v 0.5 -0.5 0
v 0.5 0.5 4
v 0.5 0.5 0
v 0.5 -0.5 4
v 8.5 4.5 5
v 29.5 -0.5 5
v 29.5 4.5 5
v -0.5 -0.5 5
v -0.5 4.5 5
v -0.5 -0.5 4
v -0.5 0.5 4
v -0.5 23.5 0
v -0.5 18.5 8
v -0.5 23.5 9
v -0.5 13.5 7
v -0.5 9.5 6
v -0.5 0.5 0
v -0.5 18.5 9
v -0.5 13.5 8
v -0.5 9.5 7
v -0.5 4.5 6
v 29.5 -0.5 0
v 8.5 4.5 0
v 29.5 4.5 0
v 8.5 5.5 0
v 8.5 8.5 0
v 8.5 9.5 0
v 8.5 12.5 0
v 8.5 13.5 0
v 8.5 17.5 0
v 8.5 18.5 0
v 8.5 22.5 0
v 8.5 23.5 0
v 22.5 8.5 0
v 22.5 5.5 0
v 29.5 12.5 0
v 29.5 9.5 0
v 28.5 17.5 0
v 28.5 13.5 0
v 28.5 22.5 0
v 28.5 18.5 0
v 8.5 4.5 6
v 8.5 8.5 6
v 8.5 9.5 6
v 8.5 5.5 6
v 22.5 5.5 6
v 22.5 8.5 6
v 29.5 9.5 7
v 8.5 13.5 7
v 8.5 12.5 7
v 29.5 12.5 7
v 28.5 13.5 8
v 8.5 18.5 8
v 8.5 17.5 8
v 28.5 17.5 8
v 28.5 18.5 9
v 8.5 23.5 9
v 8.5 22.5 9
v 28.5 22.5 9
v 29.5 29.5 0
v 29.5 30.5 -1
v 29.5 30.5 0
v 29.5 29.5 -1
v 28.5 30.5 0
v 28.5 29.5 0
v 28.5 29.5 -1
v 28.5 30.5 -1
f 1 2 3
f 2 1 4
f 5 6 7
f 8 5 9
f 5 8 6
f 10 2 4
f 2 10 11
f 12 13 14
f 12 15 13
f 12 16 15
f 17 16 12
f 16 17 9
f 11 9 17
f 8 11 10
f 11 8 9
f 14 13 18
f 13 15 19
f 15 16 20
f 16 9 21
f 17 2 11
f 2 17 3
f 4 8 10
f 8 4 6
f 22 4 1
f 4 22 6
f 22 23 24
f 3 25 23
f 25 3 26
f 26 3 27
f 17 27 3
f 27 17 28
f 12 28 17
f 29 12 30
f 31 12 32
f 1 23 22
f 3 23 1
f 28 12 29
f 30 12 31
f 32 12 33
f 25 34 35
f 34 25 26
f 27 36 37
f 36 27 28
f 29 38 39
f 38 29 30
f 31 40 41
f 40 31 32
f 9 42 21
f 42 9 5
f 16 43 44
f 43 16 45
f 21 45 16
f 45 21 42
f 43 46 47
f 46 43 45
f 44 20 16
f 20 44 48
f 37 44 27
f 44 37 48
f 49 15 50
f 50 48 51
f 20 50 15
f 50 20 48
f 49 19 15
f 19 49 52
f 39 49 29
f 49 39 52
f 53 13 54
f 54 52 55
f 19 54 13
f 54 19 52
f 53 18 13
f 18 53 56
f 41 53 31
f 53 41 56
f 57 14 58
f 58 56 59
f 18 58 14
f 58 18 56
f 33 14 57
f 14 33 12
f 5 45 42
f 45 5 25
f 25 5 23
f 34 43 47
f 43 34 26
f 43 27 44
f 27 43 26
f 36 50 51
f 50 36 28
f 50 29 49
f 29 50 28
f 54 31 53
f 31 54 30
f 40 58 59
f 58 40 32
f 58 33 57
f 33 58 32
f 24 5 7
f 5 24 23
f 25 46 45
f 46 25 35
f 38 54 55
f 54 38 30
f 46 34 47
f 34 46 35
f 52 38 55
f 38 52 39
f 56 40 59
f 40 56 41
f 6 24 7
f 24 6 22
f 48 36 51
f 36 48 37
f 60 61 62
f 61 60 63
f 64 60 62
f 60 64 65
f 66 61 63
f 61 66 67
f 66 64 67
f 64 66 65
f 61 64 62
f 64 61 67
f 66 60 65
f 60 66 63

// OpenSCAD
union() {
    translate([0, 0, 4.5]) color([1, 0, 0]) cube([1, 1, 1], center=true);
    translate([0, 1, 2.5]) cube([1, 1, 5], center=true);
    translate([0, 2, 2.5]) cube([1, 1, 5], center=true);
    translate([0, 3, 2.5]) cube([1, 1, 5], center=true);
    translate([0, 4, 2.5]) cube([1, 1, 5], center=true);
    translate([0, 5, 3.0]) cube([1, 1, 6], center=true);
    translate([0, 6, 3.0]) cube([1, 1, 6], center=true);
    translate([0, 7, 3.0]) cube([1, 1, 6], center=true);
    translate([0, 8, 3.0]) cube([1, 1, 6], center=true);
    translate([0, 9, 3.0]) cube([1, 1, 6], center=true);
    translate([0, 10, 3.5]) cube([1, 1, 7], center=true);
    translate([0, 11, 3.5]) cube([1, 1, 7], center=true);
    translate([0, 12, 3.5]) cube([1, 1, 7], center=true);
    translate([0, 13, 3.5]) cube([1, 1, 7], center=true);
    translate([0, 14, 4.0]) cube([1, 1, 8], center=true);
    translate([0, 15, 4.0]) cube([1, 1, 8], center=true);
    translate([0, 16, 4.0]) cube([1, 1, 8], center=true);
    translate([0, 17, 4.0]) cube([1, 1, 8], center=true);
    translate([0, 18, 4.0]) cube([1, 1, 8], center=true);
    translate([0, 19, 4.5]) cube([1, 1, 9], center=true);
    translate([0, 20, 4.5]) cube([1, 1, 9], center=true);
    translate([0, 21, 4.5]) cube([1, 1, 9], center=true);
    translate([0, 22, 4.5]) cube([1, 1, 9], center=true);
    translate([0, 23, 4.5]) cube([1, 1, 9], center=true);
    translate([1, 0, 2.5]) cube([1, 1, 5], center=true);
    translate([1, 1, 2.5]) cube([1, 1, 5], center=true);
    translate([1, 2, 2.5]) cube([1, 1, 5], center=true);
    translate([1, 3, 2.5]) cube([1, 1, 5], center=true);
    translate([1, 4, 2.5]) cube([1, 1, 5], center=true);
    translate([1, 5, 3.0]) cube([1, 1, 6], center=true);
    translate([1, 6, 3.0]) cube([1, 1, 6], center=true);
    translate([1, 7, 3.0]) cube([1, 1, 6], center=true);
    translate([1, 8, 3.0]) cube([1, 1, 6], center=true);
    translate([1, 9, 3.0]) cube([1, 1, 6], center=true);
    translate([1, 10, 3.5]) cube([1, 1, 7], center=true);
    translate([1, 11, 3.5]) cube([1, 1, 7], center=true);
    translate([1, 12, 3.5]) cube([1, 1, 7], center=true);
    translate([1, 13, 3.5]) cube([1, 1, 7], center=true);
    translate([1, 14, 4.0]) cube([1, 1, 8], center=true);
    translate([1, 15, 4.0]) cube([1, 1, 8], center=true);
    translate([1, 16, 4.0]) cube([1, 1, 8], center=true);
    translate([1, 17, 4.0]) cube([1, 1, 8], center=true);
    translate([1, 18, 4.0]) cube([1, 1, 8], center=true);
    translate([1, 19, 4.5]) cube([1, 1, 9], center=true);
    translate([1, 20, 4.5]) cube([1, 1, 9], center=true);
    translate([1, 21, 4.5]) cube([1, 1, 9], center=true);
    translate([1, 22, 4.5]) cube([1, 1, 9], center=true);
    translate([1, 23, 4.5]) cube([1, 1, 9], center=true);
    translate([2, 0, 2.5]) cube([1, 1, 5], center=true);
    translate([2, 1, 2.5]) cube([1, 1, 5], center=true);
    translate([2, 2, 2.5]) cube([1, 1, 5], center=true);
    translate([2, 3, 2.5]) cube([1, 1, 5], center=true);
    translate([2, 4, 2.5]) cube([1, 1, 5], center=true);
    translate([2, 5, 3.0]) cube([1, 1, 6], center=true);
    translate([2, 6, 3.0]) cube([1, 1, 6], center=true);
    translate([2, 7, 3.0]) cube([1, 1, 6], center=true);
    translate([2, 8, 3.0]) cube([1, 1, 6], center=true);
    translate([2, 9, 3.0]) cube([1, 1, 6], center=true);
    translate([2, 10, 3.5]) cube([1, 1, 7], center=true);
    translate([2, 11, 3.5]) cube([1, 1, 7], center=true);
    translate([2, 12, 3.5]) cube([1, 1, 7], center=true);
    translate([2, 13, 3.5]) cube([1, 1, 7], center=true);
    translate([2, 14, 4.0]) cube([1, 1, 8], center=true);
    translate([2, 15, 4.0]) cube([1, 1, 8], center=true);
    translate([2, 16, 4.0]) cube([1, 1, 8], center=true);
    translate([2, 17, 4.0]) cube([1, 1, 8], center=true);
    translate([2, 18, 4.0]) cube([1, 1, 8], center=true);
    translate([2, 19, 4.5]) cube([1, 1, 9], center=true);
    translate([2, 20, 4.5]) cube([1, 1, 9], center=true);
    translate([2, 21, 4.5]) cube([1, 1, 9], center=true);
    translate([2, 22, 4.5]) cube([1, 1, 9], center=true);
    translate([2, 23, 4.5]) cube([1, 1, 9], center=true);
    translate([3, 0, 2.5]) cube([1, 1, 5], center=true);
    translate([3, 1, 2.5]) cube([1, 1, 5], center=true);
    translate([3, 2, 2.5]) cube([1, 1, 5], center=true);
    translate([3, 3, 2.5]) cube([1, 1, 5], center=true);
    translate([3, 4, 2.5]) cube([1, 1, 5], center=true);
    translate([3, 5, 3.0]) cube([1, 1, 6], center=true);
    translate([3, 6, 3.0]) cube([1, 1, 6], center=true);
    translate([3, 7, 3.0]) cube([1, 1, 6], center=true);
    translate([3, 8, 3.0]) cube([1, 1, 6], center=true);
    translate([3, 9, 3.0]) cube([1, 1, 6], center=true);
    translate([3, 10, 3.5]) cube([1, 1, 7], center=true);
    translate([3, 11, 3.5]) cube([1, 1, 7], center=true);
    translate([3, 12, 3.5]) cube([1, 1, 7], center=true);
    translate([3, 13, 3.5]) cube([1, 1, 7], center=true);
    translate([3, 14, 4.0]) cube([1, 1, 8], center=true);
    translate([3, 15, 4.0]) cube([1, 1, 8], center=true);
    translate([3, 16, 4.0]) cube([1, 1, 8], center=true);
    translate([3, 17, 4.0]) cube([1, 1, 8], center=true);
    translate([3, 18, 4.0]) cube([1, 1, 8], center=true);
    translate([3, 19, 4.5]) cube([1, 1, 9], center=true);
    translate([3, 20, 4.5]) cube([1, 1, 9], center=true);
    translate([3, 21, 4.5]) cube([1, 1, 9], center=true);
    translate([3, 22, 4.5]) cube([1, 1, 9], center=true);
    translate([3, 23, 4.5]) cube([1, 1, 9], center=true);
    translate([4, 0, 2.5]) cube([1, 1, 5], center=true);
    translate([4, 1, 2.5]) cube([1, 1, 5], center=true);
    translate([4, 2, 2.5]) cube([1, 1, 5], center=true);
    translate([4, 3, 2.5]) cube([1, 1, 5], center=true);
    translate([4, 4, 2.5]) cube([1, 1, 5], center=true);
    translate([4, 5, 3.0]) cube([1, 1, 6], center=true);
    translate([4, 6, 3.0]) cube([1, 1, 6], center=true);
    translate([4, 7, 3.0]) cube([1, 1, 6], center=true);
    translate([4, 8, 3.0]) cube([1, 1, 6], center=true);
    translate([4, 9, 3.0]) cube([1, 1, 6], center=true);
    translate([4, 10, 3.5]) cube([1, 1, 7], center=true);
    translate([4, 11, 3.5]) cube([1, 1, 7], center=true);
    translate([4, 12, 3.5]) cube([1, 1, 7], center=true);
    translate([4, 13, 3.5]) cube([1, 1, 7], center=true);
    translate([4, 14, 4.0]) cube([1, 1, 8], center=true);
    translate([4, 15, 4.0]) cube([1, 1, 8], center=true);
    translate([4, 16, 4.0]) cube([1, 1, 8], center=true);
    translate([4, 17, 4.0]) cube([1, 1, 8], center=true);
    translate([4, 18, 4.0]) cube([1, 1, 8], center=true);
    translate([4, 19, 4.5]) cube([1, 1, 9], center=true);
    translate([4, 20, 4.5]) cube([1, 1, 9], center=true);
    translate([4, 21, 4.5]) cube([1, 1, 9], center=true);
    translate([4, 22, 4.5]) cube([1, 1, 9], center=true);
    translate([4, 23, 4.5]) cube([1, 1, 9], center=true);
    translate([5, 0, 2.5]) cube([1, 1, 5], center=true);
    translate([5, 1, 2.5]) cube([1, 1, 5], center=true);
    translate([5, 2, 2.5]) cube([1, 1, 5], center=true);
    translate([5, 3, 2.5]) cube([1, 1, 5], center=true);
    translate([5, 4, 2.5]) cube([1, 1, 5], center=true);
    translate([5, 5, 3.0]) cube([1, 1, 6], center=true);
    translate([5, 6, 3.0]) cube([1, 1, 6], center=true);
    translate([5, 7, 3.0]) cube([1, 1, 6], center=true);
    translate([5, 8, 3.0]) cube([1, 1, 6], center=true);
    translate([5, 9, 3.0]) cube([1, 1, 6], center=true);
    translate([5, 10, 3.5]) cube([1, 1, 7], center=true);
    translate([5, 11, 3.5]) cube([1, 1, 7], center=true);
    translate([5, 12, 3.5]) cube([1, 1, 7], center=true);
    translate([5, 13, 3.5]) cube([1, 1, 7], center=true);
    translate([5, 14, 4.0]) cube([1, 1, 8], center=true);
    translate([5, 15, 4.0]) cube([1, 1, 8], center=true);
    translate([5, 16, 4.0]) cube([1, 1, 8], center=true);
    translate([5, 17, 4.0]) cube([1, 1, 8], center=true);
    translate([5, 18, 4.0]) cube([1, 1, 8], center=true);
    translate([5, 19, 4.5]) cube([1, 1, 9], center=true);
    translate([5, 20, 4.5]) cube([1, 1, 9], center=true);
    translate([5, 21, 4.5]) cube([1, 1, 9], center=true);
    translate([5, 22, 4.5]) cube([1, 1, 9], center=true);
    translate([5, 23, 4.5]) cube([1, 1, 9], center=true);
    translate([6, 0, 2.5]) cube([1, 1, 5], center=true);
    translate([6, 1, 2.5]) cube([1, 1, 5], center=true);
    translate([6, 2, 2.5]) cube([1, 1, 5], center=true);
    translate([6, 3, 2.5]) cube([1, 1, 5], center=true);
    translate([6, 4, 2.5]) cube([1, 1, 5], center=true);
    translate([6, 5, 3.0]) cube([1, 1, 6], center=true);
    translate([6, 6, 3.0]) cube([1, 1, 6], center=true);
    translate([6, 7, 3.0]) cube([1, 1, 6], center=true);
    translate([6, 8, 3.0]) cube([1, 1, 6], center=true);
    translate([6, 9, 3.0]) cube([1, 1, 6], center=true);
    translate([6, 10, 3.5]) cube([1, 1, 7], center=true);
    translate([6, 11, 3.5]) cube([1, 1, 7], center=true);
    translate([6, 12, 3.5]) cube([1, 1, 7], center=true);
    translate([6, 13, 3.5]) cube([1, 1, 7], center=true);
    translate([6, 14, 4.0]) cube([1, 1, 8], center=true);
    translate([6, 15, 4.0]) cube([1, 1, 8], center=true);
    translate([6, 16, 4.0]) cube([1, 1, 8], center=true);
    translate([6, 17, 4.0]) cube([1, 1, 8], center=true);
    translate([6, 18, 4.0]) cube([1, 1, 8], center=true);
    translate([6, 19, 4.5]) cube([1, 1, 9], center=true);
    translate([6, 20, 4.5]) cube([1, 1, 9], center=true);
    translate([6, 21, 4.5]) cube([1, 1, 9], center=true);
    translate([6, 22, 4.5]) cube([1, 1, 9], center=true);
    translate([6, 23, 4.5]) cube([1, 1, 9], center=true);
    translate([7, 0, 2.5]) cube([1, 1, 5], center=true);
    translate([7, 1, 2.5]) cube([1, 1, 5], center=true);
    translate([7, 2, 2.5]) cube([1, 1, 5], center=true);
    translate([7, 3, 2.5]) cube([1, 1, 5], center=true);
    translate([7, 4, 2.5]) cube([1, 1, 5], center=true);
    translate([7, 5, 3.0]) cube([1, 1, 6], center=true);
    translate([7, 6, 3.0]) cube([1, 1, 6], center=true);
    translate([7, 7, 3.0]) cube([1, 1, 6], center=true);
    translate([7, 8, 3.0]) cube([1, 1, 6], center=true);
    translate([7, 9, 3.0]) cube([1, 1, 6], center=true);
    translate([7, 10, 3.5]) cube([1, 1, 7], center=true);
    translate([7, 11, 3.5]) cube([1, 1, 7], center=true);
    translate([7, 12, 3.5]) cube([1, 1, 7], center=true);
    translate([7, 13, 3.5]) cube([1, 1, 7], center=true);
    translate([7, 14, 4.0]) cube([1, 1, 8], center=true);
    translate([7, 15, 4.0]) cube([1, 1, 8], center=true);
    translate([7, 16, 4.0]) cube([1, 1, 8], center=true);
    translate([7, 17, 4.0]) cube([1, 1, 8], center=true);
    translate([7, 18, 4.0]) cube([1, 1, 8], center=true);
    translate([7, 19, 4.5]) cube([1, 1, 9], center=true);
    translate([7, 20, 4.5]) cube([1, 1, 9], center=true);
    translate([7, 21, 4.5]) cube([1, 1, 9], center=true);
    translate([7, 22, 4.5]) cube([1, 1, 9], center=true);
    translate([7, 23, 4.5]) cube([1, 1, 9], center=true);
    translate([8, 0, 2.5]) cube([1, 1, 5], center=true);
    translate([8, 1, 2.5]) cube([1, 1, 5], center=true);
    translate([8, 2, 2.5]) cube([1, 1, 5], center=true);
    translate([8, 3, 2.5]) cube([1, 1, 5], center=true);
    translate([8, 4, 2.5]) cube([1, 1, 5], center=true);
    translate([8, 5, 3.0]) cube([1, 1, 6], center=true);
    translate([8, 6, 3.0]) cube([1, 1, 6], center=true);
    translate([8, 7, 3.0]) cube([1, 1, 6], center=true);
    translate([8, 8, 3.0]) cube([1, 1, 6], center=true);
    translate([8, 9, 3.0]) cube([1, 1, 6], center=true);
    translate([8, 10, 3.5]) cube([1, 1, 7], center=true);
    translate([8, 11, 3.5]) cube([1, 1, 7], center=true);
    translate([8, 12, 3.5]) cube([1, 1, 7], center=true);
    translate([8, 13, 3.5]) cube([1, 1, 7], center=true);
    translate([8, 14, 4.0]) cube([1, 1, 8], center=true);
    translate([8, 15, 4.0]) cube([1, 1, 8], center=true);
    translate([8, 16, 4.0]) cube([1, 1, 8], center=true);
    translate([8, 17, 4.0]) cube([1, 1, 8], center=true);
    translate([8, 18, 4.0]) cube([1, 1, 8], center=true);
    translate([8, 19, 4.5]) cube([1, 1, 9], center=true);
    translate([8, 20, 4.5]) cube([1, 1, 9], center=true);
    translate([8, 21, 4.5]) cube([1, 1, 9], center=true);
    translate([8, 22, 4.5]) cube([1, 1, 9], center=true);
    translate([8, 23, 4.5]) cube([1, 1, 9], center=true);
    translate([9, 0, 2.5]) cube([1, 1, 5], center=true);
    translate([9, 1, 2.5]) cube([1, 1, 5], center=true);
    translate([9, 2, 2.5]) cube([1, 1, 5], center=true);
    translate([9, 3, 2.5]) cube([1, 1, 5], center=true);
    translate([9, 4, 2.5]) cube([1, 1, 5], center=true);
    translate([9, 6, 3.0]) cube([1, 1, 6], center=true);
    translate([9, 7, 3.0]) cube([1, 1, 6], center=true);
    translate([9, 8, 3.0]) cube([1, 1, 6], center=true);
    translate([9, 10, 3.5]) cube([1, 1, 7], center=true);
    translate([9, 11, 3.5]) cube([1, 1, 7], center=true);
    translate([9, 12, 3.5]) cube([1, 1, 7], center=true);
    translate([9, 14, 4.0]) cube([1, 1, 8], center=true);
    translate([9, 15, 4.0]) cube([1, 1, 8], center=true);
    translate([9, 16, 4.0]) cube([1, 1, 8], center=true);
    translate([9, 17, 4.0]) cube([1, 1, 8], center=true);
    translate([9, 19, 4.5]) cube([1, 1, 9], center=true);
    translate([9, 20, 4.5]) cube([1, 1, 9], center=true);
    translate([9, 21, 4.5]) cube([1, 1, 9], center=true);
    translate([9, 22, 4.5]) cube([1, 1, 9], center=true);
    translate([10, 0, 2.5]) cube([1, 1, 5], center=true);
    translate([10, 1, 2.5]) cube([1, 1, 5], center=true);
    translate([10, 2, 2.5]) cube([1, 1, 5], center=true);
    translate([10, 3, 2.5]) cube([1, 1, 5], center=true);
    translate([10, 4, 2.5]) cube([1, 1, 5], center=true);
    translate([10, 6, 3.0]) cube([1, 1, 6], center=true);
    translate([10, 7, 3.0]) cube([1, 1, 6], center=true);
    translate([10, 8, 3.0]) cube([1, 1, 6], center=true);
    translate([10, 10, 3.5]) cube([1, 1, 7], center=true);
    translate([10, 11, 3.5]) cube([1, 1, 7], center=true);
    translate([10, 12, 3.5]) cube([1, 1, 7], center=true);
    translate([10, 14, 4.0]) cube([1, 1, 8], center=true);
    translate([10, 15, 4.0]) cube([1, 1, 8], center=true);
    translate([10, 16, 4.0]) cube([1, 1, 8], center=true);
    translate([10, 17, 4.0]) cube([1, 1, 8], center=true);
    translate([10, 19, 4.5]) cube([1, 1, 9], center=true);
    translate([10, 20, 4.5]) cube([1, 1, 9], center=true);
    translate([10, 21, 4.5]) cube([1, 1, 9], center=true);
    translate([10, 22, 4.5]) cube([1, 1, 9], center=true);
    translate([11, 0, 2.5]) cube([1, 1, 5], center=true);
    translate([11, 1, 2.5]) cube([1, 1, 5], center=true);
    translate([11, 2, 2.5]) cube([1, 1, 5], center=true);
    translate([11, 3, 2.5]) cube([1, 1, 5], center=true);
    translate([11, 4, 2.5]) cube([1, 1, 5], center=true);
    translate([11, 6, 3.0]) cube([1, 1, 6], center=true);
    translate([11, 7, 3.0]) cube([1, 1, 6], center=true);
    translate([11, 8, 3.0]) cube([1, 1, 6], center=true);
    translate([11, 10, 3.5]) cube([1, 1, 7], center=true);
    translate([11, 11, 3.5]) cube([1, 1, 7], center=true);
    translate([11, 12, 3.5]) cube([1, 1, 7], center=true);
    translate([11, 14, 4.0]) cube([1, 1, 8], center=true);
    translate([11, 15, 4.0]) cube([1, 1, 8], center=true);
    translate([11, 16, 4.0]) cube([1, 1, 8], center=true);
    translate([11, 17, 4.0]) cube([1, 1, 8], center=true);
    translate([11, 19, 4.5]) cube([1, 1, 9], center=true);
    translate([11, 20, 4.5]) cube([1, 1, 9], center=true);
    translate([11, 21, 4.5]) cube([1, 1, 9], center=true);
    translate([11, 22, 4.5]) cube([1, 1, 9], center=true);
    translate([12, 0, 2.5]) cube([1, 1, 5], center=true);
    translate([12, 1, 2.5]) cube([1, 1, 5], center=true);
    translate([12, 2, 2.5]) cube([1, 1, 5], center=true);
    translate([12, 3, 2.5]) cube([1, 1, 5], center=true);
    translate([12, 4, 2.5]) cube([1, 1, 5], center=true);
    translate([12, 6, 3.0]) cube([1, 1, 6], center=true);
    translate([12, 7, 3.0]) cube([1, 1, 6], center=true);
    translate([12, 8, 3.0]) cube([1, 1, 6], center=true);
    translate([12, 10, 3.5]) cube([1, 1, 7], center=true);
    translate([12, 11, 3.5]) cube([1, 1, 7], center=true);
    translate([12, 12, 3.5]) cube([1, 1, 7], center=true);
    translate([12, 14, 4.0]) cube([1, 1, 8], center=true);
    translate([12, 15, 4.0]) cube([1, 1, 8], center=true);
    translate([12, 16, 4.0]) cube([1, 1, 8], center=true);
    translate([12, 17, 4.0]) cube([1, 1, 8], center=true);
    translate([12, 19, 4.5]) cube([1, 1, 9], center=true);
    translate([12, 20, 4.5]) cube([1, 1, 9], center=true);
    translate([12, 21, 4.5]) cube([1, 1, 9], center=true);
    translate([12, 22, 4.5]) cube([1, 1, 9], center=true);
    translate([13, 0, 2.5]) cube([1, 1, 5], center=true);
    translate([13, 1, 2.5]) cube([1, 1, 5], center=true);
    translate([13, 2, 2.5]) cube([1, 1, 5], center=true);
    translate([13, 3, 2.5]) cube([1, 1, 5], center=true);
    translate([13, 4, 2.5]) cube([1, 1, 5], center=true);
    translate([13, 6, 3.0]) cube([1, 1, 6], center=true);
    translate([13, 7, 3.0]) cube([1, 1, 6], center=true);
    translate([13, 8, 3.0]) cube([1, 1, 6], center=true);
    translate([13, 10, 3.5]) cube([1, 1, 7], center=true);
    translate([13, 11, 3.5]) cube([1, 1, 7], center=true);
    translate([13, 12, 3.5]) cube([1, 1, 7], center=true);
    translate([13, 14, 4.0]) cube([1, 1, 8], center=true);
    translate([13, 15, 4.0]) cube([1, 1, 8], center=true);
    translate([13, 16, 4.0]) cube([1, 1, 8], center=true);
    translate([13, 17, 4.0]) cube([1, 1, 8], center=true);
    translate([13, 19, 4.5]) cube([1, 1, 9], center=true);
    translate([13, 20, 4.5]) cube([1, 1, 9], center=true);
    translate([13, 21, 4.5]) cube([1, 1, 9], center=true);
    translate([13, 22, 4.5]) cube([1, 1, 9], center=true);
    translate([14, 0, 2.5]) cube([1, 1, 5], center=true);
    translate([14, 1, 2.5]) cube([1, 1, 5], center=true);
    translate([14, 2, 2.5]) cube([1, 1, 5], center=true);
    translate([14, 3, 2.5]) cube([1, 1, 5], center=true);
    translate([14, 4, 2.5]) cube([1, 1, 5], center=true);
    translate([14, 6, 3.0]) cube([1, 1, 6], center=true);
    translate([14, 7, 3.0]) cube([1, 1, 6], center=true);
    translate([14, 8, 3.0]) cube([1, 1, 6], center=true);
    translate([14, 10, 3.5]) cube([1, 1, 7], center=true);
    translate([14, 11, 3.5]) cube([1, 1, 7], center=true);
    translate([14, 12, 3.5]) cube([1, 1, 7], center=true);
    translate([14, 14, 4.0]) cube([1, 1, 8], center=true);
    translate([14, 15, 4.0]) cube([1, 1, 8], center=true);
    translate([14, 16, 4.0]) cube([1, 1, 8], center=true);
    translate([14, 17, 4.0]) cube([1, 1, 8], center=true);
    translate([14, 19, 4.5]) cube([1, 1, 9], center=true);
    translate([14, 20, 4.5]) cube([1, 1, 9], center=true);
    translate([14, 21, 4.5]) cube([1, 1, 9], center=true);
    translate([14, 22, 4.5]) cube([1, 1, 9], center=true);
    translate([15, 0, 2.5]) cube([1, 1, 5], center=true);
    translate([15, 1, 2.5]) cube([1, 1, 5], center=true);
    translate([15, 2, 2.5]) cube([1, 1, 5], center=true);
    translate([15, 3, 2.5]) cube([1, 1, 5], center=true);
    translate([15, 4, 2.5]) cube([1, 1, 5], center=true);
    translate([15, 6, 3.0]) cube([1, 1, 6], center=true);
    translate([15, 7, 3.0]) cube([1, 1, 6], center=true);
    translate([15, 8, 3.0]) cube([1, 1, 6], center=true);
    translate([15, 10, 3.5]) cube([1, 1, 7], center=true);
    translate([15, 11, 3.5]) cube([1, 1, 7], center=true);
    translate([15, 12, 3.5]) cube([1, 1, 7], center=true);
    translate([15, 14, 4.0]) cube([1, 1, 8], center=true);
    translate([15, 15, 4.0]) cube([1, 1, 8], center=true);
    translate([15, 16, 4.0]) cube([1, 1, 8], center=true);
    translate([15, 17, 4.0]) cube([1, 1, 8], center=true);
    translate([15, 19, 4.5]) cube([1, 1, 9], center=true);
    translate([15, 20, 4.5]) cube([1, 1, 9], center=true);
    translate([15, 21, 4.5]) cube([1, 1, 9], center=true);
    translate([15, 22, 4.5]) cube([1, 1, 9], center=true);
    translate([16, 0, 2.5]) cube([1, 1, 5], center=true);
    translate([16, 1, 2.5]) cube([1, 1, 5], center=true);
    translate([16, 2, 2.5]) cube([1, 1, 5], center=true);
    translate([16, 3, 2.5]) cube([1, 1, 5], center=true);
    translate([16, 4, 2.5]) cube([1, 1, 5], center=true);
    translate([16, 6, 3.0]) cube([1, 1, 6], center=true);
    translate([16, 7, 3.0]) cube([1, 1, 6], center=true);
    translate([16, 8, 3.0]) cube([1, 1, 6], center=true);
    translate([16, 10, 3.5]) cube([1, 1, 7], center=true);
    translate([16, 11, 3.5]) cube([1, 1, 7], center=true);
    translate([16, 12, 3.5]) cube([1, 1, 7], center=true);
    translate([16, 14, 4.0]) cube([1, 1, 8], center=true);
    translate([16, 15, 4.0]) cube([1, 1, 8], center=true);
    translate([16, 16, 4.0]) cube([1, 1, 8], center=true);
    translate([16, 17, 4.0]) cube([1, 1, 8], center=true);
    translate([16, 19, 4.5]) cube([1, 1, 9], center=true);
    translate([16, 20, 4.5]) cube([1, 1, 9], center=true);
    translate([16, 21, 4.5]) cube([1, 1, 9], center=true);
    translate([16, 22, 4.5]) cube([1, 1, 9], center=true);
    translate([17, 0, 2.5]) cube([1, 1, 5], center=true);
    translate([17, 1, 2.5]) cube([1, 1, 5], center=true);
    translate([17, 2, 2.5]) cube([1, 1, 5], center=true);
    translate([17, 3, 2.5]) cube([1, 1, 5], center=true);
    translate([17, 4, 2.5]) cube([1, 1, 5], center=true);
    translate([17, 6, 3.0]) cube([1, 1, 6], center=true);
    translate([17, 7, 3.0]) cube([1, 1, 6], center=true);
    translate([17, 8, 3.0]) cube([1, 1, 6], center=true);
    translate([17, 10, 3.5]) cube([1, 1, 7], center=true);
    translate([17, 11, 3.5]) cube([1, 1, 7], center=true);
    translate([17, 12, 3.5]) cube([1, 1, 7], center=true);
    translate([17, 14, 4.0]) cube([1, 1, 8], center=true);
    translate([17, 15, 4.0]) cube([1, 1, 8], center=true);
    translate([17, 16, 4.0]) cube([1, 1, 8], center=true);
    translate([17, 17, 4.0]) cube([1, 1, 8], center=true);
    translate([17, 19, 4.5]) cube([1, 1, 9], center=true);
    translate([17, 20, 4.5]) cube([1, 1, 9], center=true);
    translate([17, 21, 4.5]) cube([1, 1, 9], center=true);
    translate([17, 22, 4.5]) cube([1, 1, 9], center=true);
    translate([18, 0, 2.5]) cube([1, 1, 5], center=true);
    translate([18, 1, 2.5]) cube([1, 1, 5], center=true);
    translate([18, 2, 2.5]) cube([1, 1, 5], center=true);
    translate([18, 3, 2.5]) cube([1, 1, 5], center=true);
    translate([18, 4, 2.5]) cube([1, 1, 5], center=true);
    translate([18, 6, 3.0]) cube([1, 1, 6], center=true);
    translate([18, 7, 3.0]) cube([1, 1, 6], center=true);
    translate([18, 8, 3.0]) cube([1, 1, 6], center=true);
    translate([18, 10, 3.5]) cube([1, 1, 7], center=true);
    translate([18, 11, 3.5]) cube([1, 1, 7], center=true);
    translate([18, 12, 3.5]) cube([1, 1, 7], center=true);
    translate([18, 14, 4.0]) cube([1, 1, 8], center=true);
    translate([18, 15, 4.0]) cube([1, 1, 8], center=true);
    translate([18, 16, 4.0]) cube([1, 1, 8], center=true);
    translate([18, 17, 4.0]) cube([1, 1, 8], center=true);
    translate([18, 19, 4.5]) cube([1, 1, 9], center=true);
    translate([18, 20, 4.5]) cube([1, 1, 9], center=true);
    translate([18, 21, 4.5]) cube([1, 1, 9], center=true);
    translate([18, 22, 4.5]) cube([1, 1, 9], center=true);
    translate([19, 0, 2.5]) cube([1, 1, 5], center=true);
    translate([19, 1, 2.5]) cube([1, 1, 5], center=true);
    translate([19, 2, 2.5]) cube([1, 1, 5], center=true);
    translate([19, 3, 2.5]) cube([1, 1, 5], center=true);
    translate([19, 4, 2.5]) cube([1, 1, 5], center=true);
    translate([19, 6, 3.0]) cube([1, 1, 6], center=true);
    translate([19, 7, 3.0]) cube([1, 1, 6], center=true);
    translate([19, 8, 3.0]) cube([1, 1, 6], center=true);
    translate([19, 10, 3.5]) cube([1, 1, 7], center=true);
    translate([19, 11, 3.5]) cube([1, 1, 7], center=true);
    translate([19, 12, 3.5]) cube([1, 1, 7], center=true);
    translate([19, 14, 4.0]) cube([1, 1, 8], center=true);
    translate([19, 15, 4.0]) cube([1, 1, 8], center=true);
    translate([19, 16, 4.0]) cube([1, 1, 8], center=true);
    translate([19, 17, 4.0]) cube([1, 1, 8], center=true);
    translate([19, 19, 4.5]) cube([1, 1, 9], center=true);
    translate([19, 20, 4.5]) cube([1, 1, 9], center=true);
    translate([19, 21, 4.5]) cube([1, 1, 9], center=true);
    translate([19, 22, 4.5]) cube([1, 1, 9], center=true);
    translate([20, 0, 2.5]) cube([1, 1, 5], center=true);
    translate([20, 1, 2.5]) cube([1, 1, 5], center=true);
    translate([20, 2, 2.5]) cube([1, 1, 5], center=true);
    translate([20, 3, 2.5]) cube([1, 1, 5], center=true);
    translate([20, 4, 2.5]) cube([1, 1, 5], center=true);
    translate([20, 6, 3.0]) cube([1, 1, 6], center=true);
    translate([20, 7, 3.0]) cube([1, 1, 6], center=true);
    translate([20, 8, 3.0]) cube([1, 1, 6], center=true);
    translate([20, 10, 3.5]) cube([1, 1, 7], center=true);
    translate([20, 11, 3.5]) cube([1, 1, 7], center=true);
    translate([20, 12, 3.5]) cube([1, 1, 7], center=true);
    translate([20, 14, 4.0]) cube([1, 1, 8], center=true);
    translate([20, 15, 4.0]) cube([1, 1, 8], center=true);
    translate([20, 16, 4.0]) cube([1, 1, 8], center=true);
    translate([20, 17, 4.0]) cube([1, 1, 8], center=true);
    translate([20, 19, 4.5]) cube([1, 1, 9], center=true);
    translate([20, 20, 4.5]) cube([1, 1, 9], center=true);
    translate([20, 21, 4.5]) cube([1, 1, 9], center=true);
    translate([20, 22, 4.5]) cube([1, 1, 9], center=true);
    translate([21, 0, 2.5]) cube([1, 1, 5], center=true);
    translate([21, 1, 2.5]) cube([1, 1, 5], center=true);
    translate([21, 2, 2.5]) cube([1, 1, 5], center=true);
    translate([21, 3, 2.5]) cube([1, 1, 5], center=true);
    translate([21, 4, 2.5]) cube([1, 1, 5], center=true);
    translate([21, 6, 3.0]) cube([1, 1, 6], center=true);
    translate([21, 7, 3.0]) cube([1, 1, 6], center=true);
    translate([21, 8, 3.0]) cube([1, 1, 6], center=true);
    translate([21, 10, 3.5]) cube([1, 1, 7], center=true);
    translate([21, 11, 3.5]) cube([1, 1, 7], center=true);
    translate([21, 12, 3.5]) cube([1, 1, 7], center=true);
    translate([21, 14, 4.0]) cube([1, 1, 8], center=true);
    translate([21, 15, 4.0]) cube([1, 1, 8], center=true);
    translate([21, 16, 4.0]) cube([1, 1, 8], center=true);
    translate([21, 17, 4.0]) cube([1, 1, 8], center=true);
    translate([21, 19, 4.5]) cube([1, 1, 9], center=true);
    translate([21, 20, 4.5]) cube([1, 1, 9], center=true);
    translate([21, 21, 4.5]) cube([1, 1, 9], center=true);
    translate([21, 22, 4.5]) cube([1, 1, 9], center=true);
    translate([22, 0, 2.5]) cube([1, 1, 5], center=true);
    translate([22, 1, 2.5]) cube([1, 1, 5], center=true);
    translate([22, 2, 2.5]) cube([1, 1, 5], center=true);
    translate([22, 3, 2.5]) cube([1, 1, 5], center=true);
    translate([22, 4, 2.5]) cube([1, 1, 5], center=true);
    translate([22, 6, 3.0]) cube([1, 1, 6], center=true);
    translate([22, 7, 3.0]) cube([1, 1, 6], center=true);
    translate([22, 8, 3.0]) cube([1, 1, 6], center=true);
    translate([22, 10, 3.5]) cube([1, 1, 7], center=true);
    translate([22, 11, 3.5]) cube([1, 1, 7], center=true);
    translate([22, 12, 3.5]) cube([1, 1, 7], center=true);
    translate([22, 14, 4.0]) cube([1, 1, 8], center=true);
    translate([22, 15, 4.0]) cube([1, 1, 8], center=true);
    translate([22, 16, 4.0]) cube([1, 1, 8], center=true);
    translate([22, 17, 4.0]) cube([1, 1, 8], center=true);
    translate([22, 19, 4.5]) cube([1, 1, 9], center=true);
    translate([22, 20, 4.5]) cube([1, 1, 9], center=true);
    translate([22, 21, 4.5]) cube([1, 1, 9], center=true);
    translate([22, 22, 4.5]) cube([1, 1, 9], center=true);
    translate([23, 0, 2.5]) cube([1, 1, 5], center=true);
    translate([23, 1, 2.5]) cube([1, 1, 5], center=true);
    translate([23, 2, 2.5]) cube([1, 1, 5], center=true);
    translate([23, 3, 2.5]) cube([1, 1, 5], center=true);
    translate([23, 4, 2.5]) cube([1, 1, 5], center=true);
    translate([23, 10, 3.5]) cube([1, 1, 7], center=true);
    translate([23, 11, 3.5]) cube([1, 1, 7], center=true);
    translate([23, 12, 3.5]) cube([1, 1, 7], center=true);
    translate([23, 14, 4.0]) cube([1, 1, 8], center=true);
    translate([23, 15, 4.0]) cube([1, 1, 8], center=true);
    translate([23, 16, 4.0]) cube([1, 1, 8], center=true);
    translate([23, 17, 4.0]) cube([1, 1, 8], center=true);
    translate([23, 19, 4.5]) cube([1, 1, 9], center=true);
    translate([23, 20, 4.5]) cube([1, 1, 9], center=true);
    translate([23, 21, 4.5]) cube([1, 1, 9], center=true);
    translate([23, 22, 4.5]) cube([1, 1, 9], center=true);
    translate([24, 0, 2.5]) cube([1, 1, 5], center=true);
    translate([24, 1, 2.5]) cube([1, 1, 5], center=true);
    translate([24, 2, 2.5]) cube([1, 1, 5], center=true);
    translate([24, 3, 2.5]) cube([1, 1, 5], center=true);
    translate([24, 4, 2.5]) cube([1, 1, 5], center=true);
    translate([24, 10, 3.5]) cube([1, 1, 7], center=true);
    translate([24, 11, 3.5]) cube([1, 1, 7], center=true);
    translate([24, 12, 3.5]) cube([1, 1, 7], center=true);
    translate([24, 14, 4.0]) cube([1, 1, 8], center=true);
    translate([24, 15, 4.0]) cube([1, 1, 8], center=true);
    translate([24, 16, 4.0]) cube([1, 1, 8], center=true);
    translate([24, 17, 4.0]) cube([1, 1, 8], center=true);
    translate([24, 19, 4.5]) cube([1, 1, 9], center=true);
    translate([24, 20, 4.5]) cube([1, 1, 9], center=true);
    translate([24, 21, 4.5]) cube([1, 1, 9], center=true);
    translate([24, 22, 4.5]) cube([1, 1, 9], center=true);
    translate([25, 0, 2.5]) cube([1, 1, 5], center=true);
    translate([25, 1, 2.5]) cube([1, 1, 5], center=true);
    translate([25, 2, 2.5]) cube([1, 1, 5], center=true);
    translate([25, 3, 2.5]) cube([1, 1, 5], center=true);
    translate([25, 4, 2.5]) cube([1, 1, 5], center=true);
    translate([25, 10, 3.5]) cube([1, 1, 7], center=true);
    translate([25, 11, 3.5]) cube([1, 1, 7], center=true);
    translate([25, 12, 3.5]) cube([1, 1, 7], center=true);
    translate([25, 14, 4.0]) cube([1, 1, 8], center=true);
    translate([25, 15, 4.0]) cube([1, 1, 8], center=true);
    translate([25, 16, 4.0]) cube([1, 1, 8], center=true);
    translate([25, 17, 4.0]) cube([1, 1, 8], center=true);
    translate([25, 19, 4.5]) cube([1, 1, 9], center=true);
    translate([25, 20, 4.5]) cube([1, 1, 9], center=true);
    translate([25, 21, 4.5]) cube([1, 1, 9], center=true);
    translate([25, 22, 4.5]) cube([1, 1, 9], center=true);
    translate([26, 0, 2.5]) cube([1, 1, 5], center=true);
    translate([26, 1, 2.5]) cube([1, 1, 5], center=true);
    translate([26, 2, 2.5]) cube([1, 1, 5], center=true);
    translate([26, 3, 2.5]) cube([1, 1, 5], center=true);
    translate([26, 4, 2.5]) cube([1, 1, 5], center=true);
    translate([26, 10, 3.5]) cube([1, 1, 7], center=true);
    translate([26, 11, 3.5]) cube([1, 1, 7], center=true);
    translate([26, 12, 3.5]) cube([1, 1, 7], center=true);
    translate([26, 14, 4.0]) cube([1, 1, 8], center=true);
    translate([26, 15, 4.0]) cube([1, 1, 8], center=true);
    translate([26, 16, 4.0]) cube([1, 1, 8], center=true);
    translate([26, 17, 4.0]) cube([1, 1, 8], center=true);
    translate([26, 19, 4.5]) cube([1, 1, 9], center=true);
    translate([26, 20, 4.5]) cube([1, 1, 9], center=true);
    translate([26, 21, 4.5]) cube([1, 1, 9], center=true);
    translate([26, 22, 4.5]) cube([1, 1, 9], center=true);
    translate([27, 0, 2.5]) cube([1, 1, 5], center=true);
    translate([27, 1, 2.5]) cube([1, 1, 5], center=true);
    translate([27, 2, 2.5]) cube([1, 1, 5], center=true);
    translate([27, 3, 2.5]) cube([1, 1, 5], center=true);
    translate([27, 4, 2.5]) cube([1, 1, 5], center=true);
    translate([27, 10, 3.5]) cube([1, 1, 7], center=true);
    translate([27, 11, 3.5]) cube([1, 1, 7], center=true);
    translate([27, 12, 3.5]) cube([1, 1, 7], center=true);
    translate([27, 14, 4.0]) cube([1, 1, 8], center=true);
    translate([27, 15, 4.0]) cube([1, 1, 8], center=true);
    translate([27, 16, 4.0]) cube([1, 1, 8], center=true);
    translate([27, 17, 4.0]) cube([1, 1, 8], center=true);
    translate([27, 19, 4.5]) cube([1, 1, 9], center=true);
    translate([27, 20, 4.5]) cube([1, 1, 9], center=true);
    translate([27, 21, 4.5]) cube([1, 1, 9], center=true);
    translate([27, 22, 4.5]) cube([1, 1, 9], center=true);
    translate([28, 0, 2.5]) cube([1, 1, 5], center=true);
    translate([28, 1, 2.5]) cube([1, 1, 5], center=true);
    translate([28, 2, 2.5]) cube([1, 1, 5], center=true);
    translate([28, 3, 2.5]) cube([1, 1, 5], center=true);
    translate([28, 4, 2.5]) cube([1, 1, 5], center=true);
    translate([28, 10, 3.5]) cube([1, 1, 7], center=true);
    translate([28, 11, 3.5]) cube([1, 1, 7], center=true);
    translate([28, 12, 3.5]) cube([1, 1, 7], center=true);
    translate([28, 14, 4.0]) cube([1, 1, 8], center=true);
    translate([28, 15, 4.0]) cube([1, 1, 8], center=true);
    translate([28, 16, 4.0]) cube([1, 1, 8], center=true);
    translate([28, 17, 4.0]) cube([1, 1, 8], center=true);
    translate([28, 19, 4.5]) cube([1, 1, 9], center=true);
    translate([28, 20, 4.5]) cube([1, 1, 9], center=true);
    translate([28, 21, 4.5]) cube([1, 1, 9], center=true);
    translate([28, 22, 4.5]) cube([1, 1, 9], center=true);
    translate([29, 0, 2.5]) cube([1, 1, 5], center=true);
    translate([29, 1, 2.5]) cube([1, 1, 5], center=true);
    translate([29, 2, 2.5]) cube([1, 1, 5], center=true);
    translate([29, 3, 2.5]) cube([1, 1, 5], center=true);
    translate([29, 4, 2.5]) cube([1, 1, 5], center=true);
    translate([29, 10, 3.5]) cube([1, 1, 7], center=true);
    translate([29, 11, 3.5]) cube([1, 1, 7], center=true);
    translate([29, 12, 3.5]) cube([1, 1, 7], center=true);
    translate([29, 30, -0.5]) color([0, 0, 1]) cube([1, 1, 1], center=true);
}
